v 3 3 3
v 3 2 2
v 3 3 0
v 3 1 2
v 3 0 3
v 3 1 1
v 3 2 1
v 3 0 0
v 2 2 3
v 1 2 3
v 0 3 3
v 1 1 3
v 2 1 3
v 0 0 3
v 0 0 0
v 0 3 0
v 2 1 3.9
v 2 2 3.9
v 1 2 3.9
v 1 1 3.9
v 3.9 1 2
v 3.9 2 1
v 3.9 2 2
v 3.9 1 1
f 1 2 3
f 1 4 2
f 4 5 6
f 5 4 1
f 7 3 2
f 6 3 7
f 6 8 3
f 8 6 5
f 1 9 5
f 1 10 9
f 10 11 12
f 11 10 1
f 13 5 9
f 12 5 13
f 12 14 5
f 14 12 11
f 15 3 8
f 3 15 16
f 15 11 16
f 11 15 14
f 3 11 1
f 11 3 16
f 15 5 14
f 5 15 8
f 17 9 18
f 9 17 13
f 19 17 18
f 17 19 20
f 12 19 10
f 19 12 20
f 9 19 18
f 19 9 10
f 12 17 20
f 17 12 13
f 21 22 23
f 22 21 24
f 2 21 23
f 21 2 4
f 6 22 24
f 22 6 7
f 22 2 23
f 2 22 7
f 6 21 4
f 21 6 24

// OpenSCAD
// file: male.scad
union() {
    cube(3);
    translate([1, 1, 2.9]) {
        cube([1, 1, 1]);
    }
}
// main file
union() {
    include <male.scad>
    translate([2.9, 1, 1]) {
        cube([1, 1, 1]);
    }
}
